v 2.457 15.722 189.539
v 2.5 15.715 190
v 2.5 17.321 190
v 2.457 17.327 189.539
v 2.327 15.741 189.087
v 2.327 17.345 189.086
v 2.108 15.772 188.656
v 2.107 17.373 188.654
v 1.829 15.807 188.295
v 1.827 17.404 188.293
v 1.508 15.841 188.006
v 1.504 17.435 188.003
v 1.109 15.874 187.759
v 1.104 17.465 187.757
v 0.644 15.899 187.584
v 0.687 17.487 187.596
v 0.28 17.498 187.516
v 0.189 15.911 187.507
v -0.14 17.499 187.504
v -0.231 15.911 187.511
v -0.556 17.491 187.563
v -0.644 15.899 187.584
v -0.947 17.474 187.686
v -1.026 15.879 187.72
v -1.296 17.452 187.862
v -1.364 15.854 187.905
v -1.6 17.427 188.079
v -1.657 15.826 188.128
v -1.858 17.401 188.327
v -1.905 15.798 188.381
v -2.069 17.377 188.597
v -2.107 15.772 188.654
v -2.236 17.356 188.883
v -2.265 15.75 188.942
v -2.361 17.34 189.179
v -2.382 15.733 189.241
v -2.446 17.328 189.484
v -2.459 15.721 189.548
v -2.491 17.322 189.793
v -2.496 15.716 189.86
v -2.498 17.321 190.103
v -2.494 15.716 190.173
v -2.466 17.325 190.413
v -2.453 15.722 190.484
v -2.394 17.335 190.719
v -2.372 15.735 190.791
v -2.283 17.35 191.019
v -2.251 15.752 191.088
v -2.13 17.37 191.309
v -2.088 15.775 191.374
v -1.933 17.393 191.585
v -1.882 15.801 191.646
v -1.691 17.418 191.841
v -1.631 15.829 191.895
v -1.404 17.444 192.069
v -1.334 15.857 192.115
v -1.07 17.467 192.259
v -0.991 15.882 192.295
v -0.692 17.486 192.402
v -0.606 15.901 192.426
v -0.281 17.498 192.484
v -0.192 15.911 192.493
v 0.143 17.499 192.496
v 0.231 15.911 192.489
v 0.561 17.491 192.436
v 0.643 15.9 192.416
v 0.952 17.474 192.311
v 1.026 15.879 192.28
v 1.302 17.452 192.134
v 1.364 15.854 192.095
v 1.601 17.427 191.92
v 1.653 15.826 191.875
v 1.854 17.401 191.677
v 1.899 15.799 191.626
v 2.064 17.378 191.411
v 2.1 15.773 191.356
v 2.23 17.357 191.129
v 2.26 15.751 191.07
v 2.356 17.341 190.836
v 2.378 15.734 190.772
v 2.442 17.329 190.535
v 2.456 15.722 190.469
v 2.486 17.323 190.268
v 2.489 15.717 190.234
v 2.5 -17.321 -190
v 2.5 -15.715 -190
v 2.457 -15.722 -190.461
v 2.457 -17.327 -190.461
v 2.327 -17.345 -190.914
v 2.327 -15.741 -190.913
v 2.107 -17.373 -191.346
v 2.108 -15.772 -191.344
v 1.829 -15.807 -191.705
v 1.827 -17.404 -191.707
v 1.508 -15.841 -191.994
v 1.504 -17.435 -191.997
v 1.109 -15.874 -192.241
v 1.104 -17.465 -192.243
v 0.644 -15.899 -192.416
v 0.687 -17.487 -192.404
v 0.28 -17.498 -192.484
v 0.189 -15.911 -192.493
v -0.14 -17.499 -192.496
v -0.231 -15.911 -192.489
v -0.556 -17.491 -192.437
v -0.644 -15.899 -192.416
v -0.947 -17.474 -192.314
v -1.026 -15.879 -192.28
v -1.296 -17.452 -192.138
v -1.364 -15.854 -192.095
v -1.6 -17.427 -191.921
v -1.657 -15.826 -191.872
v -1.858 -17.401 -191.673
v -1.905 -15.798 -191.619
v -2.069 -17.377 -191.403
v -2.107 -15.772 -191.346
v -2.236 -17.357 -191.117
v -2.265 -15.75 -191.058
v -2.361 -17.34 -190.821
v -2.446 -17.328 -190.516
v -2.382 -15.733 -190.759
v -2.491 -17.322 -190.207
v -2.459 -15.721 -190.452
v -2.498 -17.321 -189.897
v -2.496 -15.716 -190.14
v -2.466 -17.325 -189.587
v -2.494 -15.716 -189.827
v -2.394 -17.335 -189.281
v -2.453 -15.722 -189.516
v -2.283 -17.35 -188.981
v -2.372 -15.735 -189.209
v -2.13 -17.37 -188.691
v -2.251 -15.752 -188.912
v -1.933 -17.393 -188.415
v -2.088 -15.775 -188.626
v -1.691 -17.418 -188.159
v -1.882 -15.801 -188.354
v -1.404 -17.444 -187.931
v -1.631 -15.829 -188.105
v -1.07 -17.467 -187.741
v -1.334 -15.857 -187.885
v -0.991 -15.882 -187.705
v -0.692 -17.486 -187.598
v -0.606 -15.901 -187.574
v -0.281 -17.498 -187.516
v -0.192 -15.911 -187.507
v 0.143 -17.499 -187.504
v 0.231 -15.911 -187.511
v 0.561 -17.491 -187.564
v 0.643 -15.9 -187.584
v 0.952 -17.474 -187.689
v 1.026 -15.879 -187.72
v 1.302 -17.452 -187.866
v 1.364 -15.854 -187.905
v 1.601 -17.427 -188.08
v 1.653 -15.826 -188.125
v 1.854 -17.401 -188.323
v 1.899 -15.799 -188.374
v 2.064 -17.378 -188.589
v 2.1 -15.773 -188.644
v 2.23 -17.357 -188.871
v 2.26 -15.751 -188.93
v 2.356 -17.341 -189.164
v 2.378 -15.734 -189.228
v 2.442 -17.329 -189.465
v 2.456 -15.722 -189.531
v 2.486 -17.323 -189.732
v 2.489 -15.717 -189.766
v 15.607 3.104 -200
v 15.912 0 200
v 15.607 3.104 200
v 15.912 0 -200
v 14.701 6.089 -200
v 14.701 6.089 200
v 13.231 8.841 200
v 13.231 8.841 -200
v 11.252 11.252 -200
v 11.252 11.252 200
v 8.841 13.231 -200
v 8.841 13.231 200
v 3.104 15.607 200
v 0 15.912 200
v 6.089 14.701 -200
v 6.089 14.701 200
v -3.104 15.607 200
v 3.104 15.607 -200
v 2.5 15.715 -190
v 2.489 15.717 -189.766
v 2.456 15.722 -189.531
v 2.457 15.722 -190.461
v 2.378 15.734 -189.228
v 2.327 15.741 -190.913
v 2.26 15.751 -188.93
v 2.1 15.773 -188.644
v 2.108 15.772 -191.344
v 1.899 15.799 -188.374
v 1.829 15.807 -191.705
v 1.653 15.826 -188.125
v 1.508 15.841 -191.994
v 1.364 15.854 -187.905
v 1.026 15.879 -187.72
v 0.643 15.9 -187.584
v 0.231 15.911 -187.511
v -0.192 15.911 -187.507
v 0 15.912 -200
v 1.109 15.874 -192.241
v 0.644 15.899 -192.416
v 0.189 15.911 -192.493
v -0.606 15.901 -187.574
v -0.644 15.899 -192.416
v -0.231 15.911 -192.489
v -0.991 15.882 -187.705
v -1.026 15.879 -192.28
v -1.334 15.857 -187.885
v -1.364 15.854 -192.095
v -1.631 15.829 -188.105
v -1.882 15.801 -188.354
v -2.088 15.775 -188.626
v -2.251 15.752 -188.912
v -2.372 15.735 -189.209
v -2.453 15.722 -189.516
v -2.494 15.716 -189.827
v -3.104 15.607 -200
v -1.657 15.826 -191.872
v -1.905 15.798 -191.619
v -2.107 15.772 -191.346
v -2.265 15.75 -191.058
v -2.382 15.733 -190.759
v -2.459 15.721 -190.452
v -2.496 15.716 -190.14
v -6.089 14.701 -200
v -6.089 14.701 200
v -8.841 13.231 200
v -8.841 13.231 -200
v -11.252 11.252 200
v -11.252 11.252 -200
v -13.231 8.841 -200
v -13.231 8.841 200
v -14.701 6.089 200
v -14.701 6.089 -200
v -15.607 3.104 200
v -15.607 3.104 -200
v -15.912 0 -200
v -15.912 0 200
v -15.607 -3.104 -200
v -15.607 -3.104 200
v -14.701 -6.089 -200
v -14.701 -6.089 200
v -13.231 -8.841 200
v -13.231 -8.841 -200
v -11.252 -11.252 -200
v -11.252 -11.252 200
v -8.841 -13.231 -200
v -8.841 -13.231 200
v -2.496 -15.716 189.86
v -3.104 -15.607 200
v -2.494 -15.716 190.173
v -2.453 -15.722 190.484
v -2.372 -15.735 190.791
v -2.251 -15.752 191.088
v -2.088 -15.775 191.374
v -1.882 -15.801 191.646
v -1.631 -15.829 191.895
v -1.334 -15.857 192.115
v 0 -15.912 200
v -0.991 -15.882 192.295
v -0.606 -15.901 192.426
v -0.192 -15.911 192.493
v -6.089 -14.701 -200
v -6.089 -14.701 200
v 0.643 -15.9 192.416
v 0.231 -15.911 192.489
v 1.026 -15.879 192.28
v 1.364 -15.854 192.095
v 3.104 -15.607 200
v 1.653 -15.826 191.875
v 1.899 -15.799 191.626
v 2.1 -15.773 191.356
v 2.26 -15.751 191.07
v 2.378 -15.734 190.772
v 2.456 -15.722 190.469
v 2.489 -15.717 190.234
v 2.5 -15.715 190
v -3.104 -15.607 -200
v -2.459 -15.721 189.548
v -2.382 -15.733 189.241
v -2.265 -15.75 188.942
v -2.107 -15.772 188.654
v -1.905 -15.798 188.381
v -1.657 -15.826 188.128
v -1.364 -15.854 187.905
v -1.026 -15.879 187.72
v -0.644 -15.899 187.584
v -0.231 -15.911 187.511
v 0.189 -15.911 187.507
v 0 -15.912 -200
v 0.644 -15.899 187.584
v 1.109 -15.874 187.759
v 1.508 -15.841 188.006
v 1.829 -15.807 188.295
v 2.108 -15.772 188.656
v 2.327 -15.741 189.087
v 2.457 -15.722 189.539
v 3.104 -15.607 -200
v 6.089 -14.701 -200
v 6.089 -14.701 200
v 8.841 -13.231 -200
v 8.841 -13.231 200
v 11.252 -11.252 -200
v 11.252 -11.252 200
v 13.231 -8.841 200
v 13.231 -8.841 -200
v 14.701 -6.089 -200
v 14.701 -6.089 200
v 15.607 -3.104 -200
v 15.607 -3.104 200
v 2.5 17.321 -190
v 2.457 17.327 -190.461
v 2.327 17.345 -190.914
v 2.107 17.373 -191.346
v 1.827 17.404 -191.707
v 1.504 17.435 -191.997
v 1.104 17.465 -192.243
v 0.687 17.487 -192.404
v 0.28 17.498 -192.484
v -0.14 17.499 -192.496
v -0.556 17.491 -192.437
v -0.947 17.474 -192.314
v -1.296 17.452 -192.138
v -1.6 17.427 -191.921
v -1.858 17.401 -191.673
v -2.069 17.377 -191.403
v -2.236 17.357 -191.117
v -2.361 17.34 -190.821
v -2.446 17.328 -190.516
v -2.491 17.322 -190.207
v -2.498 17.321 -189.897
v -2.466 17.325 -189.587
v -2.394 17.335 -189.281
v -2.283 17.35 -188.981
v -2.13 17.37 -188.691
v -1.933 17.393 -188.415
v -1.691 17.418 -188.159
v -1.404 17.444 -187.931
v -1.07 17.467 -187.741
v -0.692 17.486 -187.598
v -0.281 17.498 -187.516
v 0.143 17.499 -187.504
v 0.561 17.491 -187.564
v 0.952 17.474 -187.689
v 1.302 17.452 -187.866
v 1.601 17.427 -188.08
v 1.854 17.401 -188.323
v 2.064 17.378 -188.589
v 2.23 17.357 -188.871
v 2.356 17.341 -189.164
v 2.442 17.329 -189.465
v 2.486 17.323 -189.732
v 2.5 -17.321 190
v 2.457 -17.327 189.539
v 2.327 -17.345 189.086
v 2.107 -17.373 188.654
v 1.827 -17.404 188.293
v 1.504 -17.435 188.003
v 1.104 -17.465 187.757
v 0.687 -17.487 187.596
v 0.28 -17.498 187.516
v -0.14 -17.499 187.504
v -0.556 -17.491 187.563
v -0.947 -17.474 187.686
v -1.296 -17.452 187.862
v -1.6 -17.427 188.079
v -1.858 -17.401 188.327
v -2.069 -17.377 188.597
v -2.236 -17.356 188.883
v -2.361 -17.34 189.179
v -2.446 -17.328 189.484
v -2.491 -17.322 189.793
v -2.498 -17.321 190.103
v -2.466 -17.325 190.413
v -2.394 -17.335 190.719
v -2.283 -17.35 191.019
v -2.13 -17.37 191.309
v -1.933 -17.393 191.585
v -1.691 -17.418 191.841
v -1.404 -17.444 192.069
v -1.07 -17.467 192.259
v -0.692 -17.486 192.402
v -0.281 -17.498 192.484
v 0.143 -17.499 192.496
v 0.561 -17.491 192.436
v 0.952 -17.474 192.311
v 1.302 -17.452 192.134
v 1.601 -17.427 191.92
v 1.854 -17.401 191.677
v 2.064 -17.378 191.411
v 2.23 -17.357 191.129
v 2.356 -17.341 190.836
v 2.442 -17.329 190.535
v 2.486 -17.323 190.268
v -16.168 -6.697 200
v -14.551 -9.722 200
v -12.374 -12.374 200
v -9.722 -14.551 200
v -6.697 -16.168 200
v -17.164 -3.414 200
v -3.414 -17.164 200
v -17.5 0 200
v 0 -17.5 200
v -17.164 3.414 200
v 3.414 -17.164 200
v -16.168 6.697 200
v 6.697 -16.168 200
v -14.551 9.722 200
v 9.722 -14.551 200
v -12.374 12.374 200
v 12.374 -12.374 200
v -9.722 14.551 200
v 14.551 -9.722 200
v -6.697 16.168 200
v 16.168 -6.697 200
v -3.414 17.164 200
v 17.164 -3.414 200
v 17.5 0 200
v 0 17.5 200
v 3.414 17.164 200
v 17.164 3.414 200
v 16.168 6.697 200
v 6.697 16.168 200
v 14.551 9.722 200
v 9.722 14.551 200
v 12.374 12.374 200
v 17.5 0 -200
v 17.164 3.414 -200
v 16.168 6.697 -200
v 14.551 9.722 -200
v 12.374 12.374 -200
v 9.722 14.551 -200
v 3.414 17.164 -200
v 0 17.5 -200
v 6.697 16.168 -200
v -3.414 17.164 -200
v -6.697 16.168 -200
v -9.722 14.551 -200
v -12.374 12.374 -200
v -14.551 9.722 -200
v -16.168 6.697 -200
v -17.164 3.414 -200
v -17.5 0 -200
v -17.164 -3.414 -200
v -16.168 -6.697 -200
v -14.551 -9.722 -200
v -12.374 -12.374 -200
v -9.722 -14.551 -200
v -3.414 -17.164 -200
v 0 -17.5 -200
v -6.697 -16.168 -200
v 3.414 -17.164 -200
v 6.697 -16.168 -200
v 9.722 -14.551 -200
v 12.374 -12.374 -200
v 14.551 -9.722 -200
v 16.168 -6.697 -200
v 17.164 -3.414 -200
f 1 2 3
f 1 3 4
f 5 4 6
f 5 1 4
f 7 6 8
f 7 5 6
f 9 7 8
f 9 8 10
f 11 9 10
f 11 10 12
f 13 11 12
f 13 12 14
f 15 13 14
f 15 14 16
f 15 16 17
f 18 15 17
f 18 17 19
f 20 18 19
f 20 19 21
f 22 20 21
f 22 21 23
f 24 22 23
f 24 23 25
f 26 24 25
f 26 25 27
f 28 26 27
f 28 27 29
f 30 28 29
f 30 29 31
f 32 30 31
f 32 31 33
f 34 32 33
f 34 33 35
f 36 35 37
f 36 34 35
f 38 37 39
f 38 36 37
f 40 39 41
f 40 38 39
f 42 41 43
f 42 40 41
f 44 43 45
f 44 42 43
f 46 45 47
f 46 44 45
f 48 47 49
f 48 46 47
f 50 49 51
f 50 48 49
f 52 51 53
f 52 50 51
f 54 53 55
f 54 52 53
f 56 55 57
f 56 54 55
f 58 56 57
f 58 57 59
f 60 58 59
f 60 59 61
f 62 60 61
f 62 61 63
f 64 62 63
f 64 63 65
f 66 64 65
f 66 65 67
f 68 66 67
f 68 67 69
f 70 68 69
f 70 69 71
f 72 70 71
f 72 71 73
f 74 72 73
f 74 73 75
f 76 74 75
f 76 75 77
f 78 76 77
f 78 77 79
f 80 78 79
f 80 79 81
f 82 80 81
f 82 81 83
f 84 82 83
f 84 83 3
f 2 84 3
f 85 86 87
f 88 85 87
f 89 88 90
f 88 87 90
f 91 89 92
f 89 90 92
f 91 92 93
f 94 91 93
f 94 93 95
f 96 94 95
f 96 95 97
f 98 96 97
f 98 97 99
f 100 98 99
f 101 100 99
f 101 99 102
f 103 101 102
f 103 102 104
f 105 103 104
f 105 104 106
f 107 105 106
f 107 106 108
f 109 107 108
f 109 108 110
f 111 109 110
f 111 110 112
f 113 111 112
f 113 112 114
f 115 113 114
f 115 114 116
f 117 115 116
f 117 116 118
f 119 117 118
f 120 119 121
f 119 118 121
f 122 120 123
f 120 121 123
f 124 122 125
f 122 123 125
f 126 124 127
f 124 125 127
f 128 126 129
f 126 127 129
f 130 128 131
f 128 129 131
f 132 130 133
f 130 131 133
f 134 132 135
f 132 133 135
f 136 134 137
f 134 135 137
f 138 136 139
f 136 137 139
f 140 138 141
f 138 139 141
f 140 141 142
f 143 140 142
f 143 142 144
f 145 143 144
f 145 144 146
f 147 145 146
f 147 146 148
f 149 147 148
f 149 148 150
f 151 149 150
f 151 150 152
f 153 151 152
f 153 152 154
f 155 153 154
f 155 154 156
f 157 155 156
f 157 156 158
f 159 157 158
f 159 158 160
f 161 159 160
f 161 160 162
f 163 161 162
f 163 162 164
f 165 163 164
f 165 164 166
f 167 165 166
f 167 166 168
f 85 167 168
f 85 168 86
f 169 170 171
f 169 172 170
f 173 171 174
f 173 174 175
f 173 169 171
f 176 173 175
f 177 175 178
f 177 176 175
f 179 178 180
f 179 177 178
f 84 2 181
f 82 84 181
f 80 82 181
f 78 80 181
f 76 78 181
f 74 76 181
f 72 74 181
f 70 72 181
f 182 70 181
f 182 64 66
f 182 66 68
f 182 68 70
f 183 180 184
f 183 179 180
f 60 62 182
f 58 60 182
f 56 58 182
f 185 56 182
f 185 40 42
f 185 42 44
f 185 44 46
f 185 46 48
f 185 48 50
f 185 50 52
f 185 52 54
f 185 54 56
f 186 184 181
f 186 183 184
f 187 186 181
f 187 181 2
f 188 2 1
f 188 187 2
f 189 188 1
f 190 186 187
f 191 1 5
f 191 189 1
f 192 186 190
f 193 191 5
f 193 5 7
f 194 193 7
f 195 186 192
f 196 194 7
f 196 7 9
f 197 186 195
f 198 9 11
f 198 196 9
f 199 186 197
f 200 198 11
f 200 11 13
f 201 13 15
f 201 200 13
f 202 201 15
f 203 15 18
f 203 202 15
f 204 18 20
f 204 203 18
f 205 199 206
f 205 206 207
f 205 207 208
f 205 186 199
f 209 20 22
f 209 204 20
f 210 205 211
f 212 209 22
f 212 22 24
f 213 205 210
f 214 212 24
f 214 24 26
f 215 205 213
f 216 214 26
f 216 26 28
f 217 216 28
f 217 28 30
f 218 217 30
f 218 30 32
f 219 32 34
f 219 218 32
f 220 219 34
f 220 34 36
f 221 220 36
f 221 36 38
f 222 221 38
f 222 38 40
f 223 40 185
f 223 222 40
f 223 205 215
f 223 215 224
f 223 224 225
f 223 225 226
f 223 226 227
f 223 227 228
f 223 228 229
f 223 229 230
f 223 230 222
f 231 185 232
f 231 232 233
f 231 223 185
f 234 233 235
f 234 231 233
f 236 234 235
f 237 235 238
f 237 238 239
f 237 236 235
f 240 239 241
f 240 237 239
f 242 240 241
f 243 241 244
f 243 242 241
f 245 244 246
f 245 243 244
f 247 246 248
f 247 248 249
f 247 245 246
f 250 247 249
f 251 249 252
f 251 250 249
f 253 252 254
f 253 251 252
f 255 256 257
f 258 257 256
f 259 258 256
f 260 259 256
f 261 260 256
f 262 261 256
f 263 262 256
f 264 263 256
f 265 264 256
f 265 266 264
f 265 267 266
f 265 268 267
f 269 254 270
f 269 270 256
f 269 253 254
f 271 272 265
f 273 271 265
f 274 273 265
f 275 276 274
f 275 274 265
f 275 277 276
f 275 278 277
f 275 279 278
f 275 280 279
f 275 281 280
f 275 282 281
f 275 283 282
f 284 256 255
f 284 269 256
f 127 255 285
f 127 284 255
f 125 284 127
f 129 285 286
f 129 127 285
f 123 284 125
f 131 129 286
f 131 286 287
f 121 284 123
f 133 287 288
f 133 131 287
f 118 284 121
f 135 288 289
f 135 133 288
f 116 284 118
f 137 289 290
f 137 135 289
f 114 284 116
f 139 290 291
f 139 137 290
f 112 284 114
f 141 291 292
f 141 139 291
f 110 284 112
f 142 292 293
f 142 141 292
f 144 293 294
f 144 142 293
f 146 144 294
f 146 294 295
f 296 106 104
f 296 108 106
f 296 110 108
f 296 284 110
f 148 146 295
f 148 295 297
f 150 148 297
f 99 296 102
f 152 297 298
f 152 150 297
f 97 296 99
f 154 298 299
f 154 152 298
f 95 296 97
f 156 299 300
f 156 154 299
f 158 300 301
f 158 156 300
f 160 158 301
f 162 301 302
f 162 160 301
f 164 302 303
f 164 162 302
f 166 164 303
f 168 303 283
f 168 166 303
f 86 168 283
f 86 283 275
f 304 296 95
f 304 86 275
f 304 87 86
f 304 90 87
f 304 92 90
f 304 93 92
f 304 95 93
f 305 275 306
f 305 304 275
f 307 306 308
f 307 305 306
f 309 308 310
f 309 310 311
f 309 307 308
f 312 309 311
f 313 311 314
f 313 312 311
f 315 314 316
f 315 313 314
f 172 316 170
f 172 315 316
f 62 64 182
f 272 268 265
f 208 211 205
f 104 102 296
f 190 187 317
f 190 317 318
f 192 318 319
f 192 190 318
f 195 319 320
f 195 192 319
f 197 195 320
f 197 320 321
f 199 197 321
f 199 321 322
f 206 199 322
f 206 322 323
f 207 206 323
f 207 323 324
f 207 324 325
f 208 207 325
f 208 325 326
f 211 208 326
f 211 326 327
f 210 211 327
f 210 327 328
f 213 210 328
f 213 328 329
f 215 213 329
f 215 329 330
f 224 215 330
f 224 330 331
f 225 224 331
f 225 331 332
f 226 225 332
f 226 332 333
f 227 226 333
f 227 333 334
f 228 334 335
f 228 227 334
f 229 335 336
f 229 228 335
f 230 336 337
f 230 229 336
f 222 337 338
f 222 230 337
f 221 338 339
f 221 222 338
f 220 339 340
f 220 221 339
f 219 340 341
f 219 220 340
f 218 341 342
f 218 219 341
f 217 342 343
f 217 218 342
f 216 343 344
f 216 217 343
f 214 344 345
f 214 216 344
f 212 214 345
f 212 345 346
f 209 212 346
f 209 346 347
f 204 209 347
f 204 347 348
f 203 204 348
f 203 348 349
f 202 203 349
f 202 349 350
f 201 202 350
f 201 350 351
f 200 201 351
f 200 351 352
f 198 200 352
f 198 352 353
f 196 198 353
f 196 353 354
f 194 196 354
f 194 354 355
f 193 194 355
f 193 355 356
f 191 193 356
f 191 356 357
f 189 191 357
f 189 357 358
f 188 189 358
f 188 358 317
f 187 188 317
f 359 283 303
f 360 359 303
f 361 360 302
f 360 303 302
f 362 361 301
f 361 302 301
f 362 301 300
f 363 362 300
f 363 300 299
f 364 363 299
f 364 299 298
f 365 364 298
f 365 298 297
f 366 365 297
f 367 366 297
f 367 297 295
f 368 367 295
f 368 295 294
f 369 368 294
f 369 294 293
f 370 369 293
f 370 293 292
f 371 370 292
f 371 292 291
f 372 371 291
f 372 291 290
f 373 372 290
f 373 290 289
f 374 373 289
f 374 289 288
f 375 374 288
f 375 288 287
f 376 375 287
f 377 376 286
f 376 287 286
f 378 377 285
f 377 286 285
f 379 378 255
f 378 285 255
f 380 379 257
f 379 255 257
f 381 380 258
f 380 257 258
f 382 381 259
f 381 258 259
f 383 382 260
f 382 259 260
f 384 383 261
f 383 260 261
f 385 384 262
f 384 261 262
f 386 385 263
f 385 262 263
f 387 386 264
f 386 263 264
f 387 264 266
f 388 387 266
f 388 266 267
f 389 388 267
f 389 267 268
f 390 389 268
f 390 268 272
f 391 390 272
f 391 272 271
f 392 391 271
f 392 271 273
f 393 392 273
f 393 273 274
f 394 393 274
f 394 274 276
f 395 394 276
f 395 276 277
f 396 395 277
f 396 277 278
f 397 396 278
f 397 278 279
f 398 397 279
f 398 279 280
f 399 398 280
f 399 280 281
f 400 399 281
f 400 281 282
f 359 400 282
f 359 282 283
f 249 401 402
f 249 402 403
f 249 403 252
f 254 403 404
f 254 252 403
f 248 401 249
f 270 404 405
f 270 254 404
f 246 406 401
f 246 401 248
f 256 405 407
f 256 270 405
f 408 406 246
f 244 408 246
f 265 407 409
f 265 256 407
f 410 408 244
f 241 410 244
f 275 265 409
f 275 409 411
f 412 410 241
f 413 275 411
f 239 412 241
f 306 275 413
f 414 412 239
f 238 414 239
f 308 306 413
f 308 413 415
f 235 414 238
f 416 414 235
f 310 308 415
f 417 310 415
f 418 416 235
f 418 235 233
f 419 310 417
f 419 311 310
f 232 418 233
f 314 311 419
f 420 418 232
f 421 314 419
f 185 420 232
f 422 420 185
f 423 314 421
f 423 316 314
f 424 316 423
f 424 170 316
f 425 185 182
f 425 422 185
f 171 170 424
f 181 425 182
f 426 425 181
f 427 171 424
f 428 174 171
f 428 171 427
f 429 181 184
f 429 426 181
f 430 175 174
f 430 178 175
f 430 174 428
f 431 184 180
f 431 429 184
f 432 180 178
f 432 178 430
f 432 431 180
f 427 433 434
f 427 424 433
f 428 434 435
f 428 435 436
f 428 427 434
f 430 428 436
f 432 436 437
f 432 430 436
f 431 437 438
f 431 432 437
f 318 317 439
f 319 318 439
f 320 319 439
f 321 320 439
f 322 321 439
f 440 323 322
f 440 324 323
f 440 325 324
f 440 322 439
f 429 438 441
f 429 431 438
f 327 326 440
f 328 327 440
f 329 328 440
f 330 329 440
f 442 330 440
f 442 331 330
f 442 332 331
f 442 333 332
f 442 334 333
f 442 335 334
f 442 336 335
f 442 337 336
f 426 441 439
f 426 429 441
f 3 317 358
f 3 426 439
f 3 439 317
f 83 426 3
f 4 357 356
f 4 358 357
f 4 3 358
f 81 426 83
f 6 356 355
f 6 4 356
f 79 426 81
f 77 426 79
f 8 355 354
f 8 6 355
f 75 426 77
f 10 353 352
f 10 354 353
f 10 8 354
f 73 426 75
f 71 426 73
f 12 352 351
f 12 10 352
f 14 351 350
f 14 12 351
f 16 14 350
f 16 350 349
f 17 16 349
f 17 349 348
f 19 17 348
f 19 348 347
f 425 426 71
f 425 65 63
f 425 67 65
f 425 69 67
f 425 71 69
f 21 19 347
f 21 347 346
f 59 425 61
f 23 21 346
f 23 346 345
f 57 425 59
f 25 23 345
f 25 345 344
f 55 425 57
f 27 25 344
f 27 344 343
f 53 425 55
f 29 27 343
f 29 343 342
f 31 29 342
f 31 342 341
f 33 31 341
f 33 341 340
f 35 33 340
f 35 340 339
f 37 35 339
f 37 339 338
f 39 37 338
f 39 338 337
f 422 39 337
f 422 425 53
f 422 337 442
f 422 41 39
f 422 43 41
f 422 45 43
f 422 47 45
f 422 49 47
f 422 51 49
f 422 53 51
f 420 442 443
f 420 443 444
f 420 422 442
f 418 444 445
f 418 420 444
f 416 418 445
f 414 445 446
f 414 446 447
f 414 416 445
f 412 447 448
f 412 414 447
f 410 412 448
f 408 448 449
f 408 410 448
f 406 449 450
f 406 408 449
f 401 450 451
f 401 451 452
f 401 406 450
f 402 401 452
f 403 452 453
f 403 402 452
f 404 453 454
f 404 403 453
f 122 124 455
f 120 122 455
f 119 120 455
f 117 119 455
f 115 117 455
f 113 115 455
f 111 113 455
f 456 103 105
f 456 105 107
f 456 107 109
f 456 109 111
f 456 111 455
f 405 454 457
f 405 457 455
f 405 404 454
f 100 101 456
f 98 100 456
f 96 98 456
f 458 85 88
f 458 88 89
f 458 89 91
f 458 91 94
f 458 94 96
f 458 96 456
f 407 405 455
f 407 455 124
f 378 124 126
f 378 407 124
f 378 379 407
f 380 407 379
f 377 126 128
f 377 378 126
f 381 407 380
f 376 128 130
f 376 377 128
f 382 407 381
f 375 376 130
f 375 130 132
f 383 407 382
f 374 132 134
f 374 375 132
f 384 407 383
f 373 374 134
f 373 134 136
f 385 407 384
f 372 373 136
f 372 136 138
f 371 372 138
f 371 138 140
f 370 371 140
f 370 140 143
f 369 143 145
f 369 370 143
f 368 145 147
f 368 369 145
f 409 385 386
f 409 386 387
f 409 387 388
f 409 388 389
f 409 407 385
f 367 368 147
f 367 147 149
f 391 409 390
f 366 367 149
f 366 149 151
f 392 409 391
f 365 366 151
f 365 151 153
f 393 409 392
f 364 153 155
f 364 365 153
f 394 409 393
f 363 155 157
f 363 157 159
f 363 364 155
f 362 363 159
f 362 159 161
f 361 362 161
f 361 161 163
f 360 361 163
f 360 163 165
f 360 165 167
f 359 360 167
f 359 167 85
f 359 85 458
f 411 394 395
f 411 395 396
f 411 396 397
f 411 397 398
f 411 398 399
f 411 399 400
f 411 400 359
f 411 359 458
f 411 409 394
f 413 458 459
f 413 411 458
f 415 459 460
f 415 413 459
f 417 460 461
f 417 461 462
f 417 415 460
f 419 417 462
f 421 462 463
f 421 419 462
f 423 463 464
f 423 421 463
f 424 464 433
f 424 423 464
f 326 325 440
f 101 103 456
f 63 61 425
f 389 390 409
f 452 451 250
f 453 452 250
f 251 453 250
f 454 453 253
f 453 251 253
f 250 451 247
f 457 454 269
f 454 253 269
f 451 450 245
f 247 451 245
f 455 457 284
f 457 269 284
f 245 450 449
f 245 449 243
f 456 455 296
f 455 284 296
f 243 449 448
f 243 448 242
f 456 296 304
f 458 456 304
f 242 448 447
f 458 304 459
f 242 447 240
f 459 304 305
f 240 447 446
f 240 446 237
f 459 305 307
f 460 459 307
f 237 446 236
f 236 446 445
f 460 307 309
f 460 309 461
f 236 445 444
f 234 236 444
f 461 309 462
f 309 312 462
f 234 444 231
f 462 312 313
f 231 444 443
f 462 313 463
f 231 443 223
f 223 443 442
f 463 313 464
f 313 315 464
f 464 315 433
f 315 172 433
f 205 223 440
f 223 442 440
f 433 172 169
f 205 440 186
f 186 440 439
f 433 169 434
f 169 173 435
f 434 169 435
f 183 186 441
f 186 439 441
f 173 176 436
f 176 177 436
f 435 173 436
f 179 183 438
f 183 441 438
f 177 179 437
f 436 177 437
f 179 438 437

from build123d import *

# Parameters (mm, degrees)
SKETCH1_R                    = 17.5
SKETCH1_R_2                  = 15.9125
BOSS_EXTRUDE1_DEPTH          = 200
ESQUISSE1_R                  = 2.5
ENL_V_MAT_EXTRU_1_DEPTH      = 18.5
ENL_V_MAT_EXTRU_1_DEPTH_BACK = 18.5


with BuildPart() as part:
    # Sketch1 → Boss-Extrude1 (new body, symmetric)
    with BuildSketch(Plane.XY):
        Circle(SKETCH1_R)
        Circle(SKETCH1_R_2, mode=Mode.SUBTRACT)
    extrude(amount=BOSS_EXTRUDE1_DEPTH, both=True)

    # Esquisse1 → Enlèv. mat.-Extru.1 (cut, two sides)
    with BuildSketch(Plane(origin=(0, 0, 0), x_dir=(1, 0, 0), z_dir=(0, 1, 0))) as enl_v_mat_extru_1_sk:
        with Locations((0, 190)):
            Circle(ESQUISSE1_R)
        with Locations((0, -190)):
            Circle(ESQUISSE1_R)
    extrude(amount=ENL_V_MAT_EXTRU_1_DEPTH, mode=Mode.SUBTRACT)
    extrude(enl_v_mat_extru_1_sk.sketch, amount=-ENL_V_MAT_EXTRU_1_DEPTH_BACK, mode=Mode.SUBTRACT)


solid = part.part
